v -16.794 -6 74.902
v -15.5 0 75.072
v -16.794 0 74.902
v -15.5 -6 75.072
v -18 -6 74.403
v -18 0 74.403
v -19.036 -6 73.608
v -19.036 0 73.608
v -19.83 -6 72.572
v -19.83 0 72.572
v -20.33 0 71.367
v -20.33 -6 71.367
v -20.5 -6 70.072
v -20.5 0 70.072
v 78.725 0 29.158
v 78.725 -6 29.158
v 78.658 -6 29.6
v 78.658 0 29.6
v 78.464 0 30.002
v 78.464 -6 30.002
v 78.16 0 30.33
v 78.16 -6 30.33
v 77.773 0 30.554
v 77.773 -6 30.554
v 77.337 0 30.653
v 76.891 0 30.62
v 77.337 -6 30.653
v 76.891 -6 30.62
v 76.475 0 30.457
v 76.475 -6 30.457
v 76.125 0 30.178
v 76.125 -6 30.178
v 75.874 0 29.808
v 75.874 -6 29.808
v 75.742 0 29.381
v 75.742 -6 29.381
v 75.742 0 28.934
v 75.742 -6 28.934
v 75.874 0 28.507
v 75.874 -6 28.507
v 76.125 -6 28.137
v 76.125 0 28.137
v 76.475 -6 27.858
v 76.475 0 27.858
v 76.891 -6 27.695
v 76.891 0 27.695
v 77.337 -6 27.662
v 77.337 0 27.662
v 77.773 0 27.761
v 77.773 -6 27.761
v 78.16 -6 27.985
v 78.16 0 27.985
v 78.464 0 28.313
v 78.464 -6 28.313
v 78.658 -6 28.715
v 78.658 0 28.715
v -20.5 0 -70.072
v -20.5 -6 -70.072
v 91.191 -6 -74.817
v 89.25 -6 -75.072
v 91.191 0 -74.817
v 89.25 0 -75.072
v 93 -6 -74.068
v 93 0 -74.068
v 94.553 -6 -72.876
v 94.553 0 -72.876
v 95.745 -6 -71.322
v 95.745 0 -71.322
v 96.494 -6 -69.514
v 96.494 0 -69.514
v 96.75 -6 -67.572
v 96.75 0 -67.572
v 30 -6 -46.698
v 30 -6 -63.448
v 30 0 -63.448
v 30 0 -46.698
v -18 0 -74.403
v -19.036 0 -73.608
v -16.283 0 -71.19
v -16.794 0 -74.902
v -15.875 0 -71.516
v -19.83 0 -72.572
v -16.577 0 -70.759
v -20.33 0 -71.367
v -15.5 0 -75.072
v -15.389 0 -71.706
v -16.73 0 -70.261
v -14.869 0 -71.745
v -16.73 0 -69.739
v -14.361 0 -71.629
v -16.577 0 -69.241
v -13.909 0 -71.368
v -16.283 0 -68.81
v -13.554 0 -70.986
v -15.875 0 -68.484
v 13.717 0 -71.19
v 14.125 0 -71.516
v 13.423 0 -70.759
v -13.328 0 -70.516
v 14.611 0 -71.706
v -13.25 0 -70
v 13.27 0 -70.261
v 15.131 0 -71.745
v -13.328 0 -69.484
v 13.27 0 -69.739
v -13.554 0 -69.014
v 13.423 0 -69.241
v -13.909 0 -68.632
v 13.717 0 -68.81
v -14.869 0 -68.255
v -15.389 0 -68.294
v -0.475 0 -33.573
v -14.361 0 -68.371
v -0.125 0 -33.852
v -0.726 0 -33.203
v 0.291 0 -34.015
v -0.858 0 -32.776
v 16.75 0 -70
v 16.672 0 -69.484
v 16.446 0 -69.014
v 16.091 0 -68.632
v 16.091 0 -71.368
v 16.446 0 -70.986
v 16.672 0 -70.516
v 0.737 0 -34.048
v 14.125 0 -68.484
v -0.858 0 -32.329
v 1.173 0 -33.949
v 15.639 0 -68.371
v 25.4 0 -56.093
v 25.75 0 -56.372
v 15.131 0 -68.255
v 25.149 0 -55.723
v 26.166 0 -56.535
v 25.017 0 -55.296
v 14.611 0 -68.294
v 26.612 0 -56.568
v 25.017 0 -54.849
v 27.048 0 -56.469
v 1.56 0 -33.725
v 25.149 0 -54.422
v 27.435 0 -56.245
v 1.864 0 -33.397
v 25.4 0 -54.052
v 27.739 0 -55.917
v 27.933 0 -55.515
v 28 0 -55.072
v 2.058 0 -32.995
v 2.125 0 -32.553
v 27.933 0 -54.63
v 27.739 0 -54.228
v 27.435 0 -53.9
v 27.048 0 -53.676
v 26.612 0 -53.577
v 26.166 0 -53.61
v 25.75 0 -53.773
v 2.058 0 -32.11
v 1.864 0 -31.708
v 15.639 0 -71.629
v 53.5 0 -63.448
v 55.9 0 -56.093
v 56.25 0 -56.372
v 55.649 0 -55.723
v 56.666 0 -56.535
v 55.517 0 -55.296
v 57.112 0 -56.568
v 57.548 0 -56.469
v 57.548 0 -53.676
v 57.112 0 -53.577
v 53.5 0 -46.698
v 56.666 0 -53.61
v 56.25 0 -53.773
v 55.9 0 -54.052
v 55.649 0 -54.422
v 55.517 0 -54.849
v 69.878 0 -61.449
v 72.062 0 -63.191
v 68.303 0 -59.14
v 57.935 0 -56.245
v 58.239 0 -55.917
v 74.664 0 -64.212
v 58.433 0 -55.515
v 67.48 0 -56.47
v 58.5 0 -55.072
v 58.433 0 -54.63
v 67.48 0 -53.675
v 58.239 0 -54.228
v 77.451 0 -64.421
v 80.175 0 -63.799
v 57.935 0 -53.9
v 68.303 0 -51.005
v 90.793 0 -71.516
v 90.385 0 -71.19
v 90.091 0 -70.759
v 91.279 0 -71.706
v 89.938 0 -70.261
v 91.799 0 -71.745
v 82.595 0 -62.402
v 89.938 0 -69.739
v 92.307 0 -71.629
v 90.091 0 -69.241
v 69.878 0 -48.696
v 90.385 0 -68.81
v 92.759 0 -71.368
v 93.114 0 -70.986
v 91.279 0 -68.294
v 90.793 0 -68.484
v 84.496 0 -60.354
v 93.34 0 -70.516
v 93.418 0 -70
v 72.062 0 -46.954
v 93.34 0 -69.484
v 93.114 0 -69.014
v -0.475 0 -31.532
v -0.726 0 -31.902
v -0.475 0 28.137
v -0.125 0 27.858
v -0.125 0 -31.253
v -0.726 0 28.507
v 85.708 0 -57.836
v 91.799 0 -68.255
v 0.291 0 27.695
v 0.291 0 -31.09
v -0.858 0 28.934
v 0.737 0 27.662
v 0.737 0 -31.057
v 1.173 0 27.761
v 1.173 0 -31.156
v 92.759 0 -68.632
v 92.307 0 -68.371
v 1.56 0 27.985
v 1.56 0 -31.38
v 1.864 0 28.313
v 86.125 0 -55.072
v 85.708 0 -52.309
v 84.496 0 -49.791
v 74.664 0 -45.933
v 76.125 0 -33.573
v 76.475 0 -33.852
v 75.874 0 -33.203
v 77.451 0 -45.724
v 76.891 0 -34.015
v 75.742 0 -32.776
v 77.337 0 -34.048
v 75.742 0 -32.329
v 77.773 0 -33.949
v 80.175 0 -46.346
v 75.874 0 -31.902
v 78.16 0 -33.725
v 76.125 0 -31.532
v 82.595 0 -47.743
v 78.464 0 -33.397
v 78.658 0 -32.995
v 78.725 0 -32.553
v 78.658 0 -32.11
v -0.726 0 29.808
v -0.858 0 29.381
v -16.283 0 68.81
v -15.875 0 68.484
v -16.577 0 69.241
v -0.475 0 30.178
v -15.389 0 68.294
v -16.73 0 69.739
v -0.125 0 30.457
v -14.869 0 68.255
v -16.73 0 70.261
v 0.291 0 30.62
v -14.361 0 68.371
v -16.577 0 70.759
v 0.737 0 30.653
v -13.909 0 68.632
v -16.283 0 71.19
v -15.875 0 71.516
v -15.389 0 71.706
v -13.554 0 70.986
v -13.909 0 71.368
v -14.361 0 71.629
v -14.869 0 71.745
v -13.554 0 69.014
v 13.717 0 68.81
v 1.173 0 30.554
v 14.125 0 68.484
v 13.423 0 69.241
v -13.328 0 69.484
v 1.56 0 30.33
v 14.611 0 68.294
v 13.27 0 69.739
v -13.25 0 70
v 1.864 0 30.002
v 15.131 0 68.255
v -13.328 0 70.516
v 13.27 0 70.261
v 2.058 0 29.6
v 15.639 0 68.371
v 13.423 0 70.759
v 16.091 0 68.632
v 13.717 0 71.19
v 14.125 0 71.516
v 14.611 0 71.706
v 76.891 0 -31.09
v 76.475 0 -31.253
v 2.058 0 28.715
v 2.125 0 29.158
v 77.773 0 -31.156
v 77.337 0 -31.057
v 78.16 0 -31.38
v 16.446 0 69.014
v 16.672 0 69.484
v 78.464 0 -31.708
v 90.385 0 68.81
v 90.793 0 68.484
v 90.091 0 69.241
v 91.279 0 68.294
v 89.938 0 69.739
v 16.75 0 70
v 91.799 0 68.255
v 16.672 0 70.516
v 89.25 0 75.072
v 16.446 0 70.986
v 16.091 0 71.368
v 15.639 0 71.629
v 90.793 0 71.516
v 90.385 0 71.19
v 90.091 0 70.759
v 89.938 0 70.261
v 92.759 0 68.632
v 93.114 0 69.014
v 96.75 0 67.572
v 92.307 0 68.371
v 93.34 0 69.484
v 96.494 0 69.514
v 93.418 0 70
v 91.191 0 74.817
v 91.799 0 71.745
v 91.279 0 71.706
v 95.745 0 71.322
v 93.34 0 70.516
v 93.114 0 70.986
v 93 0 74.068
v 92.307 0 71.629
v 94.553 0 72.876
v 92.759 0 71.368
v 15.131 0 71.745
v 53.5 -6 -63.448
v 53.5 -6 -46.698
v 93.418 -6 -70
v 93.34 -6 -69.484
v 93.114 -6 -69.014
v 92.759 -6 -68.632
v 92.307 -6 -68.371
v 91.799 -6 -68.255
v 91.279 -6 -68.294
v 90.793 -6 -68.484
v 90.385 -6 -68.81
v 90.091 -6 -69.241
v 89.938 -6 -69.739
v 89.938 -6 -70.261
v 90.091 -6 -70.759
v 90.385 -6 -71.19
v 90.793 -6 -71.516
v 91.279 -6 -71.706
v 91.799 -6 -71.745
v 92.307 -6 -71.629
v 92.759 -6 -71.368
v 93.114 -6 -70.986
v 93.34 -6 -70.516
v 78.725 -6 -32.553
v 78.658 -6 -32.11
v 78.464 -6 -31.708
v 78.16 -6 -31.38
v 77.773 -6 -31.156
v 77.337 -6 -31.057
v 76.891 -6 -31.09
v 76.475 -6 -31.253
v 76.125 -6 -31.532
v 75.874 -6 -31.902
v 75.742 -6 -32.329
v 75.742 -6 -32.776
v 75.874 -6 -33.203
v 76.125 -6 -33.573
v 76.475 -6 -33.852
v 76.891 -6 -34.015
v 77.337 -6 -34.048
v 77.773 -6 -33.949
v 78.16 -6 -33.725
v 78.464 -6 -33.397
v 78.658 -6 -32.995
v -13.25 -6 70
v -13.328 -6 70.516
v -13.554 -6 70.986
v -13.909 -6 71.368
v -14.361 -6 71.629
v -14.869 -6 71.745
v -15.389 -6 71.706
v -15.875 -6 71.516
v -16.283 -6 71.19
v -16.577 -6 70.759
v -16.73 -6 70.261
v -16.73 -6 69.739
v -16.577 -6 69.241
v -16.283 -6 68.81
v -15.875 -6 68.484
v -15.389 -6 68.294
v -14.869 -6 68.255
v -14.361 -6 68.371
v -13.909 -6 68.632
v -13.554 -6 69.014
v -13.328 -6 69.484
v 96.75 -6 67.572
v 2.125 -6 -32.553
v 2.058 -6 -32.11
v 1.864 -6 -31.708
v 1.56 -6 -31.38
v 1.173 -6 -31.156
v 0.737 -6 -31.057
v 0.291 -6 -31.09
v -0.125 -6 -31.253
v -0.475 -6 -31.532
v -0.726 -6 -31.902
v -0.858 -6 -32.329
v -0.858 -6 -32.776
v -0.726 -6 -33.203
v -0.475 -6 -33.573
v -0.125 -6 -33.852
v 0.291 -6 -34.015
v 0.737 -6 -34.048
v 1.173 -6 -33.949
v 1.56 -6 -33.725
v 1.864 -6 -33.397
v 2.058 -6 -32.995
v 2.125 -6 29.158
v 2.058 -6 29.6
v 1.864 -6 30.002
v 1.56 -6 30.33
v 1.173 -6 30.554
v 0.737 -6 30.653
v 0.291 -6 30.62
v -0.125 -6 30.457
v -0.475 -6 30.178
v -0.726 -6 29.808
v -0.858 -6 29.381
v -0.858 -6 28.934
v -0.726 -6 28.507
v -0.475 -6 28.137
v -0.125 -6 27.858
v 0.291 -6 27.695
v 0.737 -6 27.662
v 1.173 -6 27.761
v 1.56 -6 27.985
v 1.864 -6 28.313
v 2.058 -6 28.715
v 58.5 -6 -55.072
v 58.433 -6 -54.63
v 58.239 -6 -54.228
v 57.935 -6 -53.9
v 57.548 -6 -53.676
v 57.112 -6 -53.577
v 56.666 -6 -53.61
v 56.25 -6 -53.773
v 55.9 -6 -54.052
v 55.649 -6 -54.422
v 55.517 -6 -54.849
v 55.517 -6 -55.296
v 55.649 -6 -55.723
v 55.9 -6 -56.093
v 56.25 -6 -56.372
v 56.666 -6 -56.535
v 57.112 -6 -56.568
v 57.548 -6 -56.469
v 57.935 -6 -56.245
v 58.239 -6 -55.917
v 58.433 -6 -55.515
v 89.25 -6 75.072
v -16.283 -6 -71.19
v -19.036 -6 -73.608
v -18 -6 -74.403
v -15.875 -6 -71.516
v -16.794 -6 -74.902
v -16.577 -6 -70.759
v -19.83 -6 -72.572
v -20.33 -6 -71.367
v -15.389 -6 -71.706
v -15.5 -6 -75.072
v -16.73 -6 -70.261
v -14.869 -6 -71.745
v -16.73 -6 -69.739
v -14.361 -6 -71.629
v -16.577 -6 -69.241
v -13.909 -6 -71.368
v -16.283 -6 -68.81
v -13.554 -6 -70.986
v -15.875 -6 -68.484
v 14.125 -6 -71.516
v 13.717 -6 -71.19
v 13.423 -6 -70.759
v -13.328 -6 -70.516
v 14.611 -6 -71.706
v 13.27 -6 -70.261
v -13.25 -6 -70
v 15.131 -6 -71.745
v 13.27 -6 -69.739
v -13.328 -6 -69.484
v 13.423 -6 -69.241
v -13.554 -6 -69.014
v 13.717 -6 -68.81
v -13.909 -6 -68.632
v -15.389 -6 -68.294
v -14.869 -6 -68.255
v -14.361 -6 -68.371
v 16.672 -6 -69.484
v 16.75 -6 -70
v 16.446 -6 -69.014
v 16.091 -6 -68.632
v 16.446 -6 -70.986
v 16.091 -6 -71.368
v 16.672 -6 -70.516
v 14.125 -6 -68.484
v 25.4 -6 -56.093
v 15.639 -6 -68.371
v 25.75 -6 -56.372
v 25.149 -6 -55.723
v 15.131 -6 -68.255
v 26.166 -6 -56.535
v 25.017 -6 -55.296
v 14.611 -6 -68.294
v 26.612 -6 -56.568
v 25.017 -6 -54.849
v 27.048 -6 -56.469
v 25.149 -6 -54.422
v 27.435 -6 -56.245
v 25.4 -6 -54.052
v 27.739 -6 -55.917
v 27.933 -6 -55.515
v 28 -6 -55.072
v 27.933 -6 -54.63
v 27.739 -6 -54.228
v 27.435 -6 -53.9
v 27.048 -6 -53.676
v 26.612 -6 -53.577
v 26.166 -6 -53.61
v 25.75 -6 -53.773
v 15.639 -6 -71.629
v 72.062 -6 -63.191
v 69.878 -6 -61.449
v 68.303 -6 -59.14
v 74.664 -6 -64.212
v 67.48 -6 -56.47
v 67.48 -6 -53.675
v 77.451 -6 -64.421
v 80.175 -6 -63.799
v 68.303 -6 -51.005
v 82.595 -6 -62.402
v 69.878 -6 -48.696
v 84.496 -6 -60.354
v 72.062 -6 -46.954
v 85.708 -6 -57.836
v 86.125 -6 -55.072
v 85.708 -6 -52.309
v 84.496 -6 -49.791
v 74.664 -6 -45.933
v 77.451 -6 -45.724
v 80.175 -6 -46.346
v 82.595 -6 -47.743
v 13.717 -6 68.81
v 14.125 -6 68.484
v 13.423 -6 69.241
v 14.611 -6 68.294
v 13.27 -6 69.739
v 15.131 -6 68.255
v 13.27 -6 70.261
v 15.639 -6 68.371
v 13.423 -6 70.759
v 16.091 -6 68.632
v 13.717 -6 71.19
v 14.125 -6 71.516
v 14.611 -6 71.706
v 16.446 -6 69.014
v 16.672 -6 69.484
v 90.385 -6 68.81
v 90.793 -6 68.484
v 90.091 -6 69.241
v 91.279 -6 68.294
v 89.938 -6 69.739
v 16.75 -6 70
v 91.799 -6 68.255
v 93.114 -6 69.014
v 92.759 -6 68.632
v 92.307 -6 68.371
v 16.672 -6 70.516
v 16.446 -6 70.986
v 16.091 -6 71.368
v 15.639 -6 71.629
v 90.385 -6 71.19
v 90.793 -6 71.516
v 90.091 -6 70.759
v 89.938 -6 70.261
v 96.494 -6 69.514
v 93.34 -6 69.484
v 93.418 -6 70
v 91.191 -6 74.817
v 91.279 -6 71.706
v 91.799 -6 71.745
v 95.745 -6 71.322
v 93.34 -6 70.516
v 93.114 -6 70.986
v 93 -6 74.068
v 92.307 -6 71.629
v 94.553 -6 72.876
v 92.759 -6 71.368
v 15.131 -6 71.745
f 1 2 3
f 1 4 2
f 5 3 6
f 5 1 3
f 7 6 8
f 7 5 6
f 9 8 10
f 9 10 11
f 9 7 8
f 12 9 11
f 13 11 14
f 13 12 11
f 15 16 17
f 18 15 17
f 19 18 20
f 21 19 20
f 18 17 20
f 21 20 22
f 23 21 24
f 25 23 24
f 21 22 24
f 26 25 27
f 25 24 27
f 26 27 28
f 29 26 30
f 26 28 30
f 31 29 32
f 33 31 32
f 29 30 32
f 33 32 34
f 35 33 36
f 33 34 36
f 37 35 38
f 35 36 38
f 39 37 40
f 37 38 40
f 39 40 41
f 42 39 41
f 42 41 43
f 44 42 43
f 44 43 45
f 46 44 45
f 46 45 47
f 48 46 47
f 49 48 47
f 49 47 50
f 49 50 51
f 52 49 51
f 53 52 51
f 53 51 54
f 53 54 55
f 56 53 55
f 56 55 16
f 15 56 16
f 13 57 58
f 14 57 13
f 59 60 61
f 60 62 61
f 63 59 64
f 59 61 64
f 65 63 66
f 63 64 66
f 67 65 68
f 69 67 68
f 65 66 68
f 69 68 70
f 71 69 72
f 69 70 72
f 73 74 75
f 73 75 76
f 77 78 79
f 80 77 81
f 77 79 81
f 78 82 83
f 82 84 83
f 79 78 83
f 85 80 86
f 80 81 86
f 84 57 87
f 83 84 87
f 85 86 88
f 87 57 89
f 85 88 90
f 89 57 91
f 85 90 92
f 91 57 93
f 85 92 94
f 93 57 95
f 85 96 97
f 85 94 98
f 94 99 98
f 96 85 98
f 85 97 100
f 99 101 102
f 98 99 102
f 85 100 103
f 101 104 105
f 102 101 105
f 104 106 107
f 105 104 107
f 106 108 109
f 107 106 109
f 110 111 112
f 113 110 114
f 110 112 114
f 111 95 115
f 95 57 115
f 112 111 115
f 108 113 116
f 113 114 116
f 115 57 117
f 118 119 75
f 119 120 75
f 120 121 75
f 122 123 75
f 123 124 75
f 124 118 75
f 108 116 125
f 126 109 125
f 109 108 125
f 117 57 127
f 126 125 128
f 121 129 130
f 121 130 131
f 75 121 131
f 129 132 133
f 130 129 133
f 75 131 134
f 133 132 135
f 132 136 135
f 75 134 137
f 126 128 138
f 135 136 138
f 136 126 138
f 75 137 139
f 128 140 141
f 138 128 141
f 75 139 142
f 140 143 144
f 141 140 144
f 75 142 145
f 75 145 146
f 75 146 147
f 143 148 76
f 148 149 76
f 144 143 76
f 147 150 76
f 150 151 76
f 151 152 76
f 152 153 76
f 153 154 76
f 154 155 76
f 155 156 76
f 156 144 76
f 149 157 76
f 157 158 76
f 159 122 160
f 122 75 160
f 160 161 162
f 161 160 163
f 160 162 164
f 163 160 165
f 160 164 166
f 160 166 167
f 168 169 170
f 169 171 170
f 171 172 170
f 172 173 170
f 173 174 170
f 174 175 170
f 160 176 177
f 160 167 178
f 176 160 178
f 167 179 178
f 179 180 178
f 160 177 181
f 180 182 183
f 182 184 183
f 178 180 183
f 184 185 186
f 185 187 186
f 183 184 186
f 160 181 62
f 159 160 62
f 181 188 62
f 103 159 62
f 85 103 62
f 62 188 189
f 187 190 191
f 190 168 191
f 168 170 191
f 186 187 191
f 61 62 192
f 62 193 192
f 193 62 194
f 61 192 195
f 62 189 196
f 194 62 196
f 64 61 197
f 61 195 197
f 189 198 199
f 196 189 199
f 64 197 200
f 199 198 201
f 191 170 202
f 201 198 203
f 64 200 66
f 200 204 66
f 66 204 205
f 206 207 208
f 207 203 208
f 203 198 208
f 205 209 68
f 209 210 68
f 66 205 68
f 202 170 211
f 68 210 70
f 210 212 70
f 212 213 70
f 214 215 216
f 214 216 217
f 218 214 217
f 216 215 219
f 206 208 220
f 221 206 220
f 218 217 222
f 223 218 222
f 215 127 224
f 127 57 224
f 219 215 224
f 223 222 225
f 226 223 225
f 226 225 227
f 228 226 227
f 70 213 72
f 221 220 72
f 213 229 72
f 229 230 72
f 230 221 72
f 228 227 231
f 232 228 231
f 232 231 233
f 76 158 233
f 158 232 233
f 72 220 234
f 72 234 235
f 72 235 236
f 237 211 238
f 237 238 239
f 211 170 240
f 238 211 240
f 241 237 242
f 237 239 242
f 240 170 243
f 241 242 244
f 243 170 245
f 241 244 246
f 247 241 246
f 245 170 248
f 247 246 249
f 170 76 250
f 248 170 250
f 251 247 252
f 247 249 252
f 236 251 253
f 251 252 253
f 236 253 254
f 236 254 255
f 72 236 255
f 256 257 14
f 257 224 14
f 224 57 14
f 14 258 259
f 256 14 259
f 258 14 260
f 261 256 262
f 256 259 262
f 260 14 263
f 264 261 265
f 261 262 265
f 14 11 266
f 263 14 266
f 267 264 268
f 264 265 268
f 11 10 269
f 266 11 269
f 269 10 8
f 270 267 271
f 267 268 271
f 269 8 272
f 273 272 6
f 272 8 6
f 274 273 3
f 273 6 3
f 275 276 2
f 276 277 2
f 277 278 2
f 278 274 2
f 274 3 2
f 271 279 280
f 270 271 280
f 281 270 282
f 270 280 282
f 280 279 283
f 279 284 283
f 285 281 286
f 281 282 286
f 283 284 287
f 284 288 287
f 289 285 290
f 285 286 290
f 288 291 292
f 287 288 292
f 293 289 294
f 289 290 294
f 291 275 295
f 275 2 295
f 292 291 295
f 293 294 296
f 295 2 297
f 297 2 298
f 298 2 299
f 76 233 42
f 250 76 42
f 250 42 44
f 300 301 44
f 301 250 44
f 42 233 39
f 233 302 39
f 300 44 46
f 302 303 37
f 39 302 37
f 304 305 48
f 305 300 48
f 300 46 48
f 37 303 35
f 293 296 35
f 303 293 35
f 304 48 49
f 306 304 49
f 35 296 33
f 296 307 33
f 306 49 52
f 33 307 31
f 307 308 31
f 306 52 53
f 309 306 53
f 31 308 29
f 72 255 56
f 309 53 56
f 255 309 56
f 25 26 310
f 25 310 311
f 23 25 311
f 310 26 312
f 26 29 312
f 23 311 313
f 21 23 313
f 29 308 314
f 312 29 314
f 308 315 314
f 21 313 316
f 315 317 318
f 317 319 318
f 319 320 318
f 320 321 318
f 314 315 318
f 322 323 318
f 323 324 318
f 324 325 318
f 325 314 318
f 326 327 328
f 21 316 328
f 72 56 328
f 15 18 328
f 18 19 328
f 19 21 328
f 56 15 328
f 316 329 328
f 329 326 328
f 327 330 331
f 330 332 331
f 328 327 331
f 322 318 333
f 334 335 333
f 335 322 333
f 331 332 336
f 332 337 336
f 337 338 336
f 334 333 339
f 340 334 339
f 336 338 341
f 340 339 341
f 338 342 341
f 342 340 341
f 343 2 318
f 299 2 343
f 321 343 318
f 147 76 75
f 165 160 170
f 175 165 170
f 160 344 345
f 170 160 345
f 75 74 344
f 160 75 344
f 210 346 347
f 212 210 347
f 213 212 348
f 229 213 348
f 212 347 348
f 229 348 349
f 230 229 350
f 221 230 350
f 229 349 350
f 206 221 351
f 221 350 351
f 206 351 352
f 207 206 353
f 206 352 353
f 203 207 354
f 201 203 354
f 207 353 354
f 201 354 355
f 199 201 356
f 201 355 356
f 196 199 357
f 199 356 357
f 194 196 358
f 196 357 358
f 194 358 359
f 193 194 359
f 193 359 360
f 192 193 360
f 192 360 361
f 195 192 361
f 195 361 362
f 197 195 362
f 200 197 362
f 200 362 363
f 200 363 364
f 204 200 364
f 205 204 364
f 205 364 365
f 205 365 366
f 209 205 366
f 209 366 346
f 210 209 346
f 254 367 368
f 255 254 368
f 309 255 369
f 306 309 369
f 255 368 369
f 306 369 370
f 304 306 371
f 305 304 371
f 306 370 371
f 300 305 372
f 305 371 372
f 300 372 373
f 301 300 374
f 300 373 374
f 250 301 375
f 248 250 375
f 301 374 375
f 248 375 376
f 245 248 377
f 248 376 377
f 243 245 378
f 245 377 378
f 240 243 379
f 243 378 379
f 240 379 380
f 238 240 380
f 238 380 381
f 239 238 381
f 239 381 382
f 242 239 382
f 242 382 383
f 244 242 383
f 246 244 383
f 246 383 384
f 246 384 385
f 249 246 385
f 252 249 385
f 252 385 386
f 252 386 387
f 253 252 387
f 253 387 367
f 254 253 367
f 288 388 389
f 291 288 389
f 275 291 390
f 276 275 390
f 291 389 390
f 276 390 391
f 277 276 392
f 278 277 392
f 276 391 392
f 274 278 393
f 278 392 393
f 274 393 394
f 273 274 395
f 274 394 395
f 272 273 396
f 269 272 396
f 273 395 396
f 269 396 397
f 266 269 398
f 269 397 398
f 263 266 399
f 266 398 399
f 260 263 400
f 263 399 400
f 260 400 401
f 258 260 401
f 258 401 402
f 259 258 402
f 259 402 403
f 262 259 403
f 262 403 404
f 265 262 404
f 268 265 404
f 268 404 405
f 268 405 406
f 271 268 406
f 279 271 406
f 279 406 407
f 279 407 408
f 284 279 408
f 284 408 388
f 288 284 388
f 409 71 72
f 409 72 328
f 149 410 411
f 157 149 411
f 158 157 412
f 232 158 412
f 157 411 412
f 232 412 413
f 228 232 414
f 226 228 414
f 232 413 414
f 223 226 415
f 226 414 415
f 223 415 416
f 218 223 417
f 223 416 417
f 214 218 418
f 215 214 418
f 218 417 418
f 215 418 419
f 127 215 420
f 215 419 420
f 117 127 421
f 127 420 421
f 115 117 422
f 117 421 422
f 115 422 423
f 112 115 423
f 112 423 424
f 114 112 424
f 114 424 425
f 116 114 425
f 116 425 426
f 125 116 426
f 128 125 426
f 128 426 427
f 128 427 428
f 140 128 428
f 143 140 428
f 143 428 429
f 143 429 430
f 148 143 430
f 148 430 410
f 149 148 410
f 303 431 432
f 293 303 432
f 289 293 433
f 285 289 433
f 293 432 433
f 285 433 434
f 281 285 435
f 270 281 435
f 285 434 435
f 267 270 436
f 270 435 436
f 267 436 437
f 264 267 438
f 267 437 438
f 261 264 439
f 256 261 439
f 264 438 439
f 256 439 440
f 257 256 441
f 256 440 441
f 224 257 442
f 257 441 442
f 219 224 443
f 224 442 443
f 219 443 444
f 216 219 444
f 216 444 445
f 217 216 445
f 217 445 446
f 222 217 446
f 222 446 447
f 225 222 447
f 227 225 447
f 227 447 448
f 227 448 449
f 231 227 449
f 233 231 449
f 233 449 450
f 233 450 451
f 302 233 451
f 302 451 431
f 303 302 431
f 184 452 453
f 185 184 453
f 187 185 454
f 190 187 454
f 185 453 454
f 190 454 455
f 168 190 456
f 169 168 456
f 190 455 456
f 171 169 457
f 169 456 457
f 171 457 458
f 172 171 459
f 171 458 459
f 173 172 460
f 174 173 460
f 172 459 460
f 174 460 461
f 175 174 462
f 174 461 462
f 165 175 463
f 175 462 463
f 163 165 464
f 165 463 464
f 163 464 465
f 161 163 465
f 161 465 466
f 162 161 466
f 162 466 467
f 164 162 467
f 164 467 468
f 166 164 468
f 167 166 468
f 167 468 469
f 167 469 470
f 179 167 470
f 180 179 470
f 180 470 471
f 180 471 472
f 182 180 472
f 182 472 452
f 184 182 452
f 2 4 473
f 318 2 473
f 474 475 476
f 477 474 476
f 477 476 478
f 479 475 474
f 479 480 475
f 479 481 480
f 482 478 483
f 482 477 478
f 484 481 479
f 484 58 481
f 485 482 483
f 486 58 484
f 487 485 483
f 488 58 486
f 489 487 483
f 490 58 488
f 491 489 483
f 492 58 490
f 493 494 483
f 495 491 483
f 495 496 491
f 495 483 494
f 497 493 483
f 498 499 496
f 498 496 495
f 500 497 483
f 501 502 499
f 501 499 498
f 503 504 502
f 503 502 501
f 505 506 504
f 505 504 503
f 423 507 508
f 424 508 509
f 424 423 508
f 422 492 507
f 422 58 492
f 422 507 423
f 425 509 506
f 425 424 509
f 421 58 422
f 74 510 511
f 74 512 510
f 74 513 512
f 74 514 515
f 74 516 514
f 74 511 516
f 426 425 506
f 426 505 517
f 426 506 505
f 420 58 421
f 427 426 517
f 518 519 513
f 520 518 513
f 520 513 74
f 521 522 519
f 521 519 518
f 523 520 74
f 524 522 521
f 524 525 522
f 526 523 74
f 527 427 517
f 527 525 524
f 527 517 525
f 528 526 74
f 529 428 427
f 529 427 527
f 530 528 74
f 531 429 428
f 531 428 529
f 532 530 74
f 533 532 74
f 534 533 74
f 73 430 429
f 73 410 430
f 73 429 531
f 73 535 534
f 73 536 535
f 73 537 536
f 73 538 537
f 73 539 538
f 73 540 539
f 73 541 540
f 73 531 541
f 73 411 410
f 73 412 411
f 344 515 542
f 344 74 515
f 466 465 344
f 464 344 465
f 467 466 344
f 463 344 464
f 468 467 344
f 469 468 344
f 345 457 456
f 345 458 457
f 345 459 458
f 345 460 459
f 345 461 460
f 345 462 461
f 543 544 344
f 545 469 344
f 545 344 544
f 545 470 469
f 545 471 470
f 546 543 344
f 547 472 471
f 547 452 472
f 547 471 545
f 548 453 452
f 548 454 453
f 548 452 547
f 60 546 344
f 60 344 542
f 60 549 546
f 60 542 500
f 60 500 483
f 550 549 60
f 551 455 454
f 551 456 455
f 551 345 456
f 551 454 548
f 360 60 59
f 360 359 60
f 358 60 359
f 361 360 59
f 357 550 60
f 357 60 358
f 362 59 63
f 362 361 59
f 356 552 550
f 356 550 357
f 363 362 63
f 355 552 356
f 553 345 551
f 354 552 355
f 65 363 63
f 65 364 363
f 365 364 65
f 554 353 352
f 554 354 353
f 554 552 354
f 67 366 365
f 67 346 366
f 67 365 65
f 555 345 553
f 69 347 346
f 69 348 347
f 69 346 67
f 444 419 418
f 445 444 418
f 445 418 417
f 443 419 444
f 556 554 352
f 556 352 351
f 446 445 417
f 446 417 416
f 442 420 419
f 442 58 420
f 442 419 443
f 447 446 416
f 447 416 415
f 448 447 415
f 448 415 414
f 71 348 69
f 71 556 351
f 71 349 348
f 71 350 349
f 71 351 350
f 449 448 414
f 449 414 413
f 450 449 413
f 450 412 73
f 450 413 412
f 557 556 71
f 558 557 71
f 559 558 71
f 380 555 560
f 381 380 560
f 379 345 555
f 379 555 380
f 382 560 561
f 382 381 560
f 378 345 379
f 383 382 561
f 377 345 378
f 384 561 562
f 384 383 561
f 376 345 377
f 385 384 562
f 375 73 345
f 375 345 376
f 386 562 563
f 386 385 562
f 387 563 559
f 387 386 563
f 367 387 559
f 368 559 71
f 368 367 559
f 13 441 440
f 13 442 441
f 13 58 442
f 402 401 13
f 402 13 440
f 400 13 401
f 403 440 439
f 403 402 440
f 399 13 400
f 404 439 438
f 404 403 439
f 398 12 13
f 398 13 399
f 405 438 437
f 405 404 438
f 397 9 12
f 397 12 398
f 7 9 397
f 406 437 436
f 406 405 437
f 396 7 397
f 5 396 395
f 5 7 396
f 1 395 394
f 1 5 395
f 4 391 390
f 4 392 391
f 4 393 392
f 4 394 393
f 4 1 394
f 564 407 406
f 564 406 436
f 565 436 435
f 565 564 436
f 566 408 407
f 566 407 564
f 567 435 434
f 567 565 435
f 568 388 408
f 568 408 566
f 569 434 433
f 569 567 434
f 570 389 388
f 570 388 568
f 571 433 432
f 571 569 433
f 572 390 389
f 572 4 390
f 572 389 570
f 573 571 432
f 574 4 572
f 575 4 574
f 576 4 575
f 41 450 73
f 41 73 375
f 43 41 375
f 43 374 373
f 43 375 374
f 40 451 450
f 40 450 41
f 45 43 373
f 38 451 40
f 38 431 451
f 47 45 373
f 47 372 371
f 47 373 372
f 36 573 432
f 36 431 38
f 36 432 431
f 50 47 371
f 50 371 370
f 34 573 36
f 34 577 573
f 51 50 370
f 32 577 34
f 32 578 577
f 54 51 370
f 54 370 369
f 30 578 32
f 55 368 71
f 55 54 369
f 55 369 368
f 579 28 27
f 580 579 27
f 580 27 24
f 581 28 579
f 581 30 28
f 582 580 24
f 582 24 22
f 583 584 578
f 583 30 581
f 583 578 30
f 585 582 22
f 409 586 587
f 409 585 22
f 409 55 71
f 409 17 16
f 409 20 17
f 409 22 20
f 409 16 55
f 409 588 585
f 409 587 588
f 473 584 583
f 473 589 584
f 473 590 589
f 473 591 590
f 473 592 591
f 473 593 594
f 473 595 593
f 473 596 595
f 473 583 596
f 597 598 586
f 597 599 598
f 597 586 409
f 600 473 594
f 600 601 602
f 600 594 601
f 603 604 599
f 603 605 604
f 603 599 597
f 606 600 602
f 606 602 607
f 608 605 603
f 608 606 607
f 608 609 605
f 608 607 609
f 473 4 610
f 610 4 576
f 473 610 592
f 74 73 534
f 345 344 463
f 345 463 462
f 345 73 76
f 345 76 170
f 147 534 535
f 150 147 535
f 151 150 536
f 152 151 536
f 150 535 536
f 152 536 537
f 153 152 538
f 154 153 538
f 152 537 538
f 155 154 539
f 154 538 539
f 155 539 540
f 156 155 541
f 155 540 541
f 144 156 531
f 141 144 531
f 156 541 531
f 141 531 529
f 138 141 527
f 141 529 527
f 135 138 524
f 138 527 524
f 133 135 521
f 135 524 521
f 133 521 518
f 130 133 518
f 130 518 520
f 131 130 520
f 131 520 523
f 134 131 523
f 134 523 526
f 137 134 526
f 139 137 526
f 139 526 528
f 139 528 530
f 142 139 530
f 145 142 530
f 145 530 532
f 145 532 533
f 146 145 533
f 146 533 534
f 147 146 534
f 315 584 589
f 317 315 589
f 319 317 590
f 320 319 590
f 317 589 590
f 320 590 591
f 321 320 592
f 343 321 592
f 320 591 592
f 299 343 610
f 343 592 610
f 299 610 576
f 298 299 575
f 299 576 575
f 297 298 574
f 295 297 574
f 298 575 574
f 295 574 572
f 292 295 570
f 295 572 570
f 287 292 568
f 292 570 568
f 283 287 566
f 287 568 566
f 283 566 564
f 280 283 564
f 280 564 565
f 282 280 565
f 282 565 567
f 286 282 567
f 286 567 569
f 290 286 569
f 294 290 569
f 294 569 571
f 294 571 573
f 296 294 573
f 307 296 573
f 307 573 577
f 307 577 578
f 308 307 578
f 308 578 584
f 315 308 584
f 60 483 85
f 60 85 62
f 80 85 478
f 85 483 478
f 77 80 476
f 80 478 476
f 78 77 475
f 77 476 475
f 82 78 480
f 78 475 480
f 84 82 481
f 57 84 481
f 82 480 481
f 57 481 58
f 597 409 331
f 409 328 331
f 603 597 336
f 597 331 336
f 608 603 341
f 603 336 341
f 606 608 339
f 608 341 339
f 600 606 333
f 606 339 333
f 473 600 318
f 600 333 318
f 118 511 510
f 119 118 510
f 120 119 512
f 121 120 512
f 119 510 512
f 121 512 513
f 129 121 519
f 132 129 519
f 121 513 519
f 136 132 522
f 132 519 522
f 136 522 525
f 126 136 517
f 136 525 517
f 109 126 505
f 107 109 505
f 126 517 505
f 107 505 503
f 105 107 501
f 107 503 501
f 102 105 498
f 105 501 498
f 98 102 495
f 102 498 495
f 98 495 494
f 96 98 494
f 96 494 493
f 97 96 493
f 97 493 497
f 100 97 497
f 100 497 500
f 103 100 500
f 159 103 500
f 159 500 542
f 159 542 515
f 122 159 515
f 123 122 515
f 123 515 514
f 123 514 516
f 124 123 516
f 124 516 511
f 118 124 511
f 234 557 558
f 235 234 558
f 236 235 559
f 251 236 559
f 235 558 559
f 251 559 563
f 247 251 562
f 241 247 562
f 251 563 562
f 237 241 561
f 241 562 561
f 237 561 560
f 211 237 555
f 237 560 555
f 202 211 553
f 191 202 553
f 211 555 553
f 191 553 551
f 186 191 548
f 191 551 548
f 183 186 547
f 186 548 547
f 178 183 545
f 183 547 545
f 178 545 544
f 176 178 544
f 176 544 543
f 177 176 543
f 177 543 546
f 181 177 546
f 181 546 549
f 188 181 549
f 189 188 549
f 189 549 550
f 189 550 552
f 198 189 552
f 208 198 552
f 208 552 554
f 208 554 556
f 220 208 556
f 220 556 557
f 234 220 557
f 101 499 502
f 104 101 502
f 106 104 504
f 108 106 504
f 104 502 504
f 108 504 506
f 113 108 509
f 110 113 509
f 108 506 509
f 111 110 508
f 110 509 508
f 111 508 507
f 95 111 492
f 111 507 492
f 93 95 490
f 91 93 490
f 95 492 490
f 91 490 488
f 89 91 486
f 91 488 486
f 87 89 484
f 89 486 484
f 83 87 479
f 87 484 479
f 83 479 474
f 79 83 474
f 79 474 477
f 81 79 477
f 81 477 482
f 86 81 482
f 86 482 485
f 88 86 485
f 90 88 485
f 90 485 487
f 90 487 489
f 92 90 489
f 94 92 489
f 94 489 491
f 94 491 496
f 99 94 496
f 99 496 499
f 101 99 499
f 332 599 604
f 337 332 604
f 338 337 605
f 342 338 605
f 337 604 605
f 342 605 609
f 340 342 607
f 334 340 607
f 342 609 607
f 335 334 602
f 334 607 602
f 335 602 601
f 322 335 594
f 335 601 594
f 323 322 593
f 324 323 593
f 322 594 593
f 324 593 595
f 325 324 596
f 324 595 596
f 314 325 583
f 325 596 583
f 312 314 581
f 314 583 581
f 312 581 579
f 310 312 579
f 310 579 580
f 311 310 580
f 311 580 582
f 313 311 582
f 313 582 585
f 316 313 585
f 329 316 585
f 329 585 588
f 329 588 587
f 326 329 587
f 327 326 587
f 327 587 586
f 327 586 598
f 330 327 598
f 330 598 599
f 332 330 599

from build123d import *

# Parameters (mm, degrees)
F0_W      = 41
F0_H      = 150.145
F1_DEPTH  = 6
F2_R      = 1.75
F3_DEPTH  = 6.001
F4_W      = 76.25
F4_H      = 150.145
F5_DEPTH  = 6
F6_R      = 5
F7_R      = 7.5
F8_R      = 1.75
F9_DEPTH  = 6.001
F10_R     = 9.375
F10_W     = 23.5
F10_H     = 16.75
F10_R_2   = 1.5
F11_DEPTH = 6.001
F12_R     = 1.5
F13_DEPTH = 6.001


with BuildPart() as f1:
    # F0 (on Front) → F1 (new body)
    with BuildSketch(Plane.XZ):
        Rectangle(F0_W, F0_H)
    extrude(amount=F1_DEPTH)

    # F2 (on face) → F3 (cut, through all)
    with BuildSketch(Plane.XZ.offset(6)):
        with Locations((-15, 70)):
            Circle(F2_R)
        with Locations((15, 70)):
            Circle(F2_R)
        with Locations((-15, -70)):
            Circle(F2_R)
        with Locations((15, -70)):
            Circle(F2_R)
    extrude(amount=-F3_DEPTH, mode=Mode.SUBTRACT)

    # F4 (on face) → F5 (join, through all)
    with BuildSketch(Plane.XZ.offset(6)):
        with Locations((58.625, 0)):
            Rectangle(F4_W, F4_H)
    extrude(amount=-F5_DEPTH)

    # F6
    f6_edges = [f1.edges().sort_by_distance(p)[0] for p in [
        (-20.5, -3, 75.0725),
        (-20.5, -3, -75.0725),
    ]]
    fillet(f6_edges, radius=F6_R)

    # F7
    f7_edges = [f1.edges().sort_by_distance(p)[0] for p in [
        (96.75, -3, 75.0725),
        (96.75, -3, -75.0725),
    ]]
    fillet(f7_edges, radius=F7_R)

    # F8 (on face) → F9 (cut, through all)
    with BuildSketch(Plane.XZ.offset(6)):
        with Locations((91.668, 70)):
            Circle(F8_R)
        with Locations((91.668, -70)):
            Circle(F8_R)
    extrude(amount=-F9_DEPTH, mode=Mode.SUBTRACT)

    # F10 (on face) → F11 (cut, through all)
    with BuildSketch(Plane.XZ.offset(6)):
        with Locations((76.75, -55.0725)):
            Circle(F10_R)
        with Locations((41.75, -55.0725)):
            Rectangle(F10_W, F10_H)
        with Locations((57, -55.0725)):
            Circle(F10_R_2)
        with Locations((26.5, -55.0725)):
            Circle(F10_R_2)
    extrude(amount=-F11_DEPTH, mode=Mode.SUBTRACT)

    # F12 (on face) → F13 (cut, through all)
    with BuildSketch(Plane.XZ.offset(6)):
        with Locations((0.625, -32.5525)):
            Circle(F12_R)
        with Locations((77.225, -32.5525)):
            Circle(F12_R)
        with Locations((0.625, 29.1575)):
            Circle(F12_R)
        with Locations((77.225, 29.1575)):
            Circle(F12_R)
    extrude(amount=-F13_DEPTH, mode=Mode.SUBTRACT)


solid = f1.part
